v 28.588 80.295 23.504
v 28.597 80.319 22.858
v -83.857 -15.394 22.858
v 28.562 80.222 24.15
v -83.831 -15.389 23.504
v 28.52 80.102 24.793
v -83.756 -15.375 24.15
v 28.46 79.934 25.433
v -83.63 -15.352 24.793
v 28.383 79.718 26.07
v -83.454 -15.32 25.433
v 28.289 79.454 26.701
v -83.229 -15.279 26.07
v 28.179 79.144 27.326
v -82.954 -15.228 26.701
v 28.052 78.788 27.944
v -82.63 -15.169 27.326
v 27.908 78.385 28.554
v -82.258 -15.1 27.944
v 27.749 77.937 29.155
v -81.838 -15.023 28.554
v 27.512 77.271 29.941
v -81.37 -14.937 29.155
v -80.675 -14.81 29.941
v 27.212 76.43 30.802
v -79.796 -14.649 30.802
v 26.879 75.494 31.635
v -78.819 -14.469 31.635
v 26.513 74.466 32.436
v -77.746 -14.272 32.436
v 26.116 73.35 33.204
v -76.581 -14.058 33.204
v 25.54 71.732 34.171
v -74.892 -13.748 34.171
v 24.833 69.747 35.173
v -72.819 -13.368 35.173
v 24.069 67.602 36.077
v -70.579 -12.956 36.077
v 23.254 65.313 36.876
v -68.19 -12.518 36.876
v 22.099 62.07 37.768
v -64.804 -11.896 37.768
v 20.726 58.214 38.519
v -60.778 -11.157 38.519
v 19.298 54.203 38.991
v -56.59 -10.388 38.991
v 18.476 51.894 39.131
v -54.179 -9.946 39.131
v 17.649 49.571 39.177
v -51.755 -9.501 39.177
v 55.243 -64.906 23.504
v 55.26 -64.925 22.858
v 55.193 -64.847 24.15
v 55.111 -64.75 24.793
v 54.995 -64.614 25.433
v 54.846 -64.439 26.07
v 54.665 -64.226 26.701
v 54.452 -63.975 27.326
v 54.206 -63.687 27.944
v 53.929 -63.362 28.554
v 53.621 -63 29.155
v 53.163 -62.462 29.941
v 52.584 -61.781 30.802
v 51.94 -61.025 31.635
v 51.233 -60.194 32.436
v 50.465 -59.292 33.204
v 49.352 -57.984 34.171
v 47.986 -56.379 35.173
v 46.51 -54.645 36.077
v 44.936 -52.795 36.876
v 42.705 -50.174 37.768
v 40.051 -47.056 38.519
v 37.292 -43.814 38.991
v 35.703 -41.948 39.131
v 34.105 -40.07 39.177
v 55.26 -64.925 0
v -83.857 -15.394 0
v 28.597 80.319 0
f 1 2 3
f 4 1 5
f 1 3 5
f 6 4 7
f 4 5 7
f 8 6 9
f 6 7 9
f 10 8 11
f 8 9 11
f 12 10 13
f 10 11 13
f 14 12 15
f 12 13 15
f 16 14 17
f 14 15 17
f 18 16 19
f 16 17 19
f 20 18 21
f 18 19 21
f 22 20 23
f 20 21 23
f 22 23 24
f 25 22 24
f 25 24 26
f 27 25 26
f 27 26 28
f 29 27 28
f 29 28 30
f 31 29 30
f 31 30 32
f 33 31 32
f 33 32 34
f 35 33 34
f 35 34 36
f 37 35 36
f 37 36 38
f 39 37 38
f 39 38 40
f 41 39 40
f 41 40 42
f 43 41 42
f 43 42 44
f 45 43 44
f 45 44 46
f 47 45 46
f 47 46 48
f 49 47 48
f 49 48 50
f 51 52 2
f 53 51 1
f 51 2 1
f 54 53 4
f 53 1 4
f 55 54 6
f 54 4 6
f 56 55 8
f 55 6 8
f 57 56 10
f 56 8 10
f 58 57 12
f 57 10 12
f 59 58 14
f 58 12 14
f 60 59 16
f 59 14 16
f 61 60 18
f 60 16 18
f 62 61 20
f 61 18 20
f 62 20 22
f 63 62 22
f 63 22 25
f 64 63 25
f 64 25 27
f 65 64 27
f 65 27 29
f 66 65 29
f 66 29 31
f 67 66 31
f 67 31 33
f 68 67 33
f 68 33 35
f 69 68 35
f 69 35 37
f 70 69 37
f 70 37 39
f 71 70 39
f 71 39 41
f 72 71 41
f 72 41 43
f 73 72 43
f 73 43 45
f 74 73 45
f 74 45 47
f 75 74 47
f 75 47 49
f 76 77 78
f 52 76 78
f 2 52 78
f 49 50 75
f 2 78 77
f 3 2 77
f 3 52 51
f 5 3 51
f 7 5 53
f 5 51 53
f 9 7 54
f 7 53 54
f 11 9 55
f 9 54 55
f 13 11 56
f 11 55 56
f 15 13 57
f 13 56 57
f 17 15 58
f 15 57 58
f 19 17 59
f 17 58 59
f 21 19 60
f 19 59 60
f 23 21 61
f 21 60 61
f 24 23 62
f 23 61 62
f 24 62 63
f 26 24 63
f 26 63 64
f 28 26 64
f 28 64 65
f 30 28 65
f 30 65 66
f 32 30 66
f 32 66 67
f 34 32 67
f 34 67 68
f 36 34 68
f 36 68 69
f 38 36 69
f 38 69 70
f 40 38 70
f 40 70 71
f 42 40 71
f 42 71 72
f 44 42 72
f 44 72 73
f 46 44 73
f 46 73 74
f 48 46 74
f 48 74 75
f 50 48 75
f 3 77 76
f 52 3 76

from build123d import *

# Parameters (mm, degrees)
F1_DEPTH = 39.177313
F2_R     = 16.31925
F3_R     = 30.097367
F4_DEPTH = 30.095011
F6_DEPTH = 26.99797


with BuildPart() as f1:
    # F0 (on Top) → F1 (new body)
    with BuildSketch(Plane.XY):
        Polygon((55.259834, -64.92503), (28.596808, 80.318935), (-83.856642, -15.393905), align=None)
    extrude(amount=F1_DEPTH)

    # F2
    f2_edges = [f1.edges().sort_by_distance(p)[0] for p in [
        (41.928321, 7.696953, 39.177313),
        (-14.298404, -40.159468, 39.177313),
        (-27.629917, 32.462515, 39.177313),
    ]]
    fillet(f2_edges, radius=F2_R)

    # F3 (on face) → F4 (join)
    with BuildSketch(Plane(origin=(0, 0, 0), x_dir=(1, 0, 0), z_dir=(0, 0, -1))):
        Circle(F3_R)
    extrude(amount=-F4_DEPTH)

    # F5 (on Top) → F6 (join)
    with BuildSketch(Plane.XY):
        Polygon((16.23941, -30.575463), (32.093639, -12.983671), (32.930897, 10.683324), (18.359422, 29.351473), (-4.80263, 34.285742), (-25.717478, 23.177331), (-34.598832, 1.223989), (-27.291009, -21.302071), (-7.213418, -33.860655), align=None)
    extrude(amount=F6_DEPTH)


solid = f1.part
